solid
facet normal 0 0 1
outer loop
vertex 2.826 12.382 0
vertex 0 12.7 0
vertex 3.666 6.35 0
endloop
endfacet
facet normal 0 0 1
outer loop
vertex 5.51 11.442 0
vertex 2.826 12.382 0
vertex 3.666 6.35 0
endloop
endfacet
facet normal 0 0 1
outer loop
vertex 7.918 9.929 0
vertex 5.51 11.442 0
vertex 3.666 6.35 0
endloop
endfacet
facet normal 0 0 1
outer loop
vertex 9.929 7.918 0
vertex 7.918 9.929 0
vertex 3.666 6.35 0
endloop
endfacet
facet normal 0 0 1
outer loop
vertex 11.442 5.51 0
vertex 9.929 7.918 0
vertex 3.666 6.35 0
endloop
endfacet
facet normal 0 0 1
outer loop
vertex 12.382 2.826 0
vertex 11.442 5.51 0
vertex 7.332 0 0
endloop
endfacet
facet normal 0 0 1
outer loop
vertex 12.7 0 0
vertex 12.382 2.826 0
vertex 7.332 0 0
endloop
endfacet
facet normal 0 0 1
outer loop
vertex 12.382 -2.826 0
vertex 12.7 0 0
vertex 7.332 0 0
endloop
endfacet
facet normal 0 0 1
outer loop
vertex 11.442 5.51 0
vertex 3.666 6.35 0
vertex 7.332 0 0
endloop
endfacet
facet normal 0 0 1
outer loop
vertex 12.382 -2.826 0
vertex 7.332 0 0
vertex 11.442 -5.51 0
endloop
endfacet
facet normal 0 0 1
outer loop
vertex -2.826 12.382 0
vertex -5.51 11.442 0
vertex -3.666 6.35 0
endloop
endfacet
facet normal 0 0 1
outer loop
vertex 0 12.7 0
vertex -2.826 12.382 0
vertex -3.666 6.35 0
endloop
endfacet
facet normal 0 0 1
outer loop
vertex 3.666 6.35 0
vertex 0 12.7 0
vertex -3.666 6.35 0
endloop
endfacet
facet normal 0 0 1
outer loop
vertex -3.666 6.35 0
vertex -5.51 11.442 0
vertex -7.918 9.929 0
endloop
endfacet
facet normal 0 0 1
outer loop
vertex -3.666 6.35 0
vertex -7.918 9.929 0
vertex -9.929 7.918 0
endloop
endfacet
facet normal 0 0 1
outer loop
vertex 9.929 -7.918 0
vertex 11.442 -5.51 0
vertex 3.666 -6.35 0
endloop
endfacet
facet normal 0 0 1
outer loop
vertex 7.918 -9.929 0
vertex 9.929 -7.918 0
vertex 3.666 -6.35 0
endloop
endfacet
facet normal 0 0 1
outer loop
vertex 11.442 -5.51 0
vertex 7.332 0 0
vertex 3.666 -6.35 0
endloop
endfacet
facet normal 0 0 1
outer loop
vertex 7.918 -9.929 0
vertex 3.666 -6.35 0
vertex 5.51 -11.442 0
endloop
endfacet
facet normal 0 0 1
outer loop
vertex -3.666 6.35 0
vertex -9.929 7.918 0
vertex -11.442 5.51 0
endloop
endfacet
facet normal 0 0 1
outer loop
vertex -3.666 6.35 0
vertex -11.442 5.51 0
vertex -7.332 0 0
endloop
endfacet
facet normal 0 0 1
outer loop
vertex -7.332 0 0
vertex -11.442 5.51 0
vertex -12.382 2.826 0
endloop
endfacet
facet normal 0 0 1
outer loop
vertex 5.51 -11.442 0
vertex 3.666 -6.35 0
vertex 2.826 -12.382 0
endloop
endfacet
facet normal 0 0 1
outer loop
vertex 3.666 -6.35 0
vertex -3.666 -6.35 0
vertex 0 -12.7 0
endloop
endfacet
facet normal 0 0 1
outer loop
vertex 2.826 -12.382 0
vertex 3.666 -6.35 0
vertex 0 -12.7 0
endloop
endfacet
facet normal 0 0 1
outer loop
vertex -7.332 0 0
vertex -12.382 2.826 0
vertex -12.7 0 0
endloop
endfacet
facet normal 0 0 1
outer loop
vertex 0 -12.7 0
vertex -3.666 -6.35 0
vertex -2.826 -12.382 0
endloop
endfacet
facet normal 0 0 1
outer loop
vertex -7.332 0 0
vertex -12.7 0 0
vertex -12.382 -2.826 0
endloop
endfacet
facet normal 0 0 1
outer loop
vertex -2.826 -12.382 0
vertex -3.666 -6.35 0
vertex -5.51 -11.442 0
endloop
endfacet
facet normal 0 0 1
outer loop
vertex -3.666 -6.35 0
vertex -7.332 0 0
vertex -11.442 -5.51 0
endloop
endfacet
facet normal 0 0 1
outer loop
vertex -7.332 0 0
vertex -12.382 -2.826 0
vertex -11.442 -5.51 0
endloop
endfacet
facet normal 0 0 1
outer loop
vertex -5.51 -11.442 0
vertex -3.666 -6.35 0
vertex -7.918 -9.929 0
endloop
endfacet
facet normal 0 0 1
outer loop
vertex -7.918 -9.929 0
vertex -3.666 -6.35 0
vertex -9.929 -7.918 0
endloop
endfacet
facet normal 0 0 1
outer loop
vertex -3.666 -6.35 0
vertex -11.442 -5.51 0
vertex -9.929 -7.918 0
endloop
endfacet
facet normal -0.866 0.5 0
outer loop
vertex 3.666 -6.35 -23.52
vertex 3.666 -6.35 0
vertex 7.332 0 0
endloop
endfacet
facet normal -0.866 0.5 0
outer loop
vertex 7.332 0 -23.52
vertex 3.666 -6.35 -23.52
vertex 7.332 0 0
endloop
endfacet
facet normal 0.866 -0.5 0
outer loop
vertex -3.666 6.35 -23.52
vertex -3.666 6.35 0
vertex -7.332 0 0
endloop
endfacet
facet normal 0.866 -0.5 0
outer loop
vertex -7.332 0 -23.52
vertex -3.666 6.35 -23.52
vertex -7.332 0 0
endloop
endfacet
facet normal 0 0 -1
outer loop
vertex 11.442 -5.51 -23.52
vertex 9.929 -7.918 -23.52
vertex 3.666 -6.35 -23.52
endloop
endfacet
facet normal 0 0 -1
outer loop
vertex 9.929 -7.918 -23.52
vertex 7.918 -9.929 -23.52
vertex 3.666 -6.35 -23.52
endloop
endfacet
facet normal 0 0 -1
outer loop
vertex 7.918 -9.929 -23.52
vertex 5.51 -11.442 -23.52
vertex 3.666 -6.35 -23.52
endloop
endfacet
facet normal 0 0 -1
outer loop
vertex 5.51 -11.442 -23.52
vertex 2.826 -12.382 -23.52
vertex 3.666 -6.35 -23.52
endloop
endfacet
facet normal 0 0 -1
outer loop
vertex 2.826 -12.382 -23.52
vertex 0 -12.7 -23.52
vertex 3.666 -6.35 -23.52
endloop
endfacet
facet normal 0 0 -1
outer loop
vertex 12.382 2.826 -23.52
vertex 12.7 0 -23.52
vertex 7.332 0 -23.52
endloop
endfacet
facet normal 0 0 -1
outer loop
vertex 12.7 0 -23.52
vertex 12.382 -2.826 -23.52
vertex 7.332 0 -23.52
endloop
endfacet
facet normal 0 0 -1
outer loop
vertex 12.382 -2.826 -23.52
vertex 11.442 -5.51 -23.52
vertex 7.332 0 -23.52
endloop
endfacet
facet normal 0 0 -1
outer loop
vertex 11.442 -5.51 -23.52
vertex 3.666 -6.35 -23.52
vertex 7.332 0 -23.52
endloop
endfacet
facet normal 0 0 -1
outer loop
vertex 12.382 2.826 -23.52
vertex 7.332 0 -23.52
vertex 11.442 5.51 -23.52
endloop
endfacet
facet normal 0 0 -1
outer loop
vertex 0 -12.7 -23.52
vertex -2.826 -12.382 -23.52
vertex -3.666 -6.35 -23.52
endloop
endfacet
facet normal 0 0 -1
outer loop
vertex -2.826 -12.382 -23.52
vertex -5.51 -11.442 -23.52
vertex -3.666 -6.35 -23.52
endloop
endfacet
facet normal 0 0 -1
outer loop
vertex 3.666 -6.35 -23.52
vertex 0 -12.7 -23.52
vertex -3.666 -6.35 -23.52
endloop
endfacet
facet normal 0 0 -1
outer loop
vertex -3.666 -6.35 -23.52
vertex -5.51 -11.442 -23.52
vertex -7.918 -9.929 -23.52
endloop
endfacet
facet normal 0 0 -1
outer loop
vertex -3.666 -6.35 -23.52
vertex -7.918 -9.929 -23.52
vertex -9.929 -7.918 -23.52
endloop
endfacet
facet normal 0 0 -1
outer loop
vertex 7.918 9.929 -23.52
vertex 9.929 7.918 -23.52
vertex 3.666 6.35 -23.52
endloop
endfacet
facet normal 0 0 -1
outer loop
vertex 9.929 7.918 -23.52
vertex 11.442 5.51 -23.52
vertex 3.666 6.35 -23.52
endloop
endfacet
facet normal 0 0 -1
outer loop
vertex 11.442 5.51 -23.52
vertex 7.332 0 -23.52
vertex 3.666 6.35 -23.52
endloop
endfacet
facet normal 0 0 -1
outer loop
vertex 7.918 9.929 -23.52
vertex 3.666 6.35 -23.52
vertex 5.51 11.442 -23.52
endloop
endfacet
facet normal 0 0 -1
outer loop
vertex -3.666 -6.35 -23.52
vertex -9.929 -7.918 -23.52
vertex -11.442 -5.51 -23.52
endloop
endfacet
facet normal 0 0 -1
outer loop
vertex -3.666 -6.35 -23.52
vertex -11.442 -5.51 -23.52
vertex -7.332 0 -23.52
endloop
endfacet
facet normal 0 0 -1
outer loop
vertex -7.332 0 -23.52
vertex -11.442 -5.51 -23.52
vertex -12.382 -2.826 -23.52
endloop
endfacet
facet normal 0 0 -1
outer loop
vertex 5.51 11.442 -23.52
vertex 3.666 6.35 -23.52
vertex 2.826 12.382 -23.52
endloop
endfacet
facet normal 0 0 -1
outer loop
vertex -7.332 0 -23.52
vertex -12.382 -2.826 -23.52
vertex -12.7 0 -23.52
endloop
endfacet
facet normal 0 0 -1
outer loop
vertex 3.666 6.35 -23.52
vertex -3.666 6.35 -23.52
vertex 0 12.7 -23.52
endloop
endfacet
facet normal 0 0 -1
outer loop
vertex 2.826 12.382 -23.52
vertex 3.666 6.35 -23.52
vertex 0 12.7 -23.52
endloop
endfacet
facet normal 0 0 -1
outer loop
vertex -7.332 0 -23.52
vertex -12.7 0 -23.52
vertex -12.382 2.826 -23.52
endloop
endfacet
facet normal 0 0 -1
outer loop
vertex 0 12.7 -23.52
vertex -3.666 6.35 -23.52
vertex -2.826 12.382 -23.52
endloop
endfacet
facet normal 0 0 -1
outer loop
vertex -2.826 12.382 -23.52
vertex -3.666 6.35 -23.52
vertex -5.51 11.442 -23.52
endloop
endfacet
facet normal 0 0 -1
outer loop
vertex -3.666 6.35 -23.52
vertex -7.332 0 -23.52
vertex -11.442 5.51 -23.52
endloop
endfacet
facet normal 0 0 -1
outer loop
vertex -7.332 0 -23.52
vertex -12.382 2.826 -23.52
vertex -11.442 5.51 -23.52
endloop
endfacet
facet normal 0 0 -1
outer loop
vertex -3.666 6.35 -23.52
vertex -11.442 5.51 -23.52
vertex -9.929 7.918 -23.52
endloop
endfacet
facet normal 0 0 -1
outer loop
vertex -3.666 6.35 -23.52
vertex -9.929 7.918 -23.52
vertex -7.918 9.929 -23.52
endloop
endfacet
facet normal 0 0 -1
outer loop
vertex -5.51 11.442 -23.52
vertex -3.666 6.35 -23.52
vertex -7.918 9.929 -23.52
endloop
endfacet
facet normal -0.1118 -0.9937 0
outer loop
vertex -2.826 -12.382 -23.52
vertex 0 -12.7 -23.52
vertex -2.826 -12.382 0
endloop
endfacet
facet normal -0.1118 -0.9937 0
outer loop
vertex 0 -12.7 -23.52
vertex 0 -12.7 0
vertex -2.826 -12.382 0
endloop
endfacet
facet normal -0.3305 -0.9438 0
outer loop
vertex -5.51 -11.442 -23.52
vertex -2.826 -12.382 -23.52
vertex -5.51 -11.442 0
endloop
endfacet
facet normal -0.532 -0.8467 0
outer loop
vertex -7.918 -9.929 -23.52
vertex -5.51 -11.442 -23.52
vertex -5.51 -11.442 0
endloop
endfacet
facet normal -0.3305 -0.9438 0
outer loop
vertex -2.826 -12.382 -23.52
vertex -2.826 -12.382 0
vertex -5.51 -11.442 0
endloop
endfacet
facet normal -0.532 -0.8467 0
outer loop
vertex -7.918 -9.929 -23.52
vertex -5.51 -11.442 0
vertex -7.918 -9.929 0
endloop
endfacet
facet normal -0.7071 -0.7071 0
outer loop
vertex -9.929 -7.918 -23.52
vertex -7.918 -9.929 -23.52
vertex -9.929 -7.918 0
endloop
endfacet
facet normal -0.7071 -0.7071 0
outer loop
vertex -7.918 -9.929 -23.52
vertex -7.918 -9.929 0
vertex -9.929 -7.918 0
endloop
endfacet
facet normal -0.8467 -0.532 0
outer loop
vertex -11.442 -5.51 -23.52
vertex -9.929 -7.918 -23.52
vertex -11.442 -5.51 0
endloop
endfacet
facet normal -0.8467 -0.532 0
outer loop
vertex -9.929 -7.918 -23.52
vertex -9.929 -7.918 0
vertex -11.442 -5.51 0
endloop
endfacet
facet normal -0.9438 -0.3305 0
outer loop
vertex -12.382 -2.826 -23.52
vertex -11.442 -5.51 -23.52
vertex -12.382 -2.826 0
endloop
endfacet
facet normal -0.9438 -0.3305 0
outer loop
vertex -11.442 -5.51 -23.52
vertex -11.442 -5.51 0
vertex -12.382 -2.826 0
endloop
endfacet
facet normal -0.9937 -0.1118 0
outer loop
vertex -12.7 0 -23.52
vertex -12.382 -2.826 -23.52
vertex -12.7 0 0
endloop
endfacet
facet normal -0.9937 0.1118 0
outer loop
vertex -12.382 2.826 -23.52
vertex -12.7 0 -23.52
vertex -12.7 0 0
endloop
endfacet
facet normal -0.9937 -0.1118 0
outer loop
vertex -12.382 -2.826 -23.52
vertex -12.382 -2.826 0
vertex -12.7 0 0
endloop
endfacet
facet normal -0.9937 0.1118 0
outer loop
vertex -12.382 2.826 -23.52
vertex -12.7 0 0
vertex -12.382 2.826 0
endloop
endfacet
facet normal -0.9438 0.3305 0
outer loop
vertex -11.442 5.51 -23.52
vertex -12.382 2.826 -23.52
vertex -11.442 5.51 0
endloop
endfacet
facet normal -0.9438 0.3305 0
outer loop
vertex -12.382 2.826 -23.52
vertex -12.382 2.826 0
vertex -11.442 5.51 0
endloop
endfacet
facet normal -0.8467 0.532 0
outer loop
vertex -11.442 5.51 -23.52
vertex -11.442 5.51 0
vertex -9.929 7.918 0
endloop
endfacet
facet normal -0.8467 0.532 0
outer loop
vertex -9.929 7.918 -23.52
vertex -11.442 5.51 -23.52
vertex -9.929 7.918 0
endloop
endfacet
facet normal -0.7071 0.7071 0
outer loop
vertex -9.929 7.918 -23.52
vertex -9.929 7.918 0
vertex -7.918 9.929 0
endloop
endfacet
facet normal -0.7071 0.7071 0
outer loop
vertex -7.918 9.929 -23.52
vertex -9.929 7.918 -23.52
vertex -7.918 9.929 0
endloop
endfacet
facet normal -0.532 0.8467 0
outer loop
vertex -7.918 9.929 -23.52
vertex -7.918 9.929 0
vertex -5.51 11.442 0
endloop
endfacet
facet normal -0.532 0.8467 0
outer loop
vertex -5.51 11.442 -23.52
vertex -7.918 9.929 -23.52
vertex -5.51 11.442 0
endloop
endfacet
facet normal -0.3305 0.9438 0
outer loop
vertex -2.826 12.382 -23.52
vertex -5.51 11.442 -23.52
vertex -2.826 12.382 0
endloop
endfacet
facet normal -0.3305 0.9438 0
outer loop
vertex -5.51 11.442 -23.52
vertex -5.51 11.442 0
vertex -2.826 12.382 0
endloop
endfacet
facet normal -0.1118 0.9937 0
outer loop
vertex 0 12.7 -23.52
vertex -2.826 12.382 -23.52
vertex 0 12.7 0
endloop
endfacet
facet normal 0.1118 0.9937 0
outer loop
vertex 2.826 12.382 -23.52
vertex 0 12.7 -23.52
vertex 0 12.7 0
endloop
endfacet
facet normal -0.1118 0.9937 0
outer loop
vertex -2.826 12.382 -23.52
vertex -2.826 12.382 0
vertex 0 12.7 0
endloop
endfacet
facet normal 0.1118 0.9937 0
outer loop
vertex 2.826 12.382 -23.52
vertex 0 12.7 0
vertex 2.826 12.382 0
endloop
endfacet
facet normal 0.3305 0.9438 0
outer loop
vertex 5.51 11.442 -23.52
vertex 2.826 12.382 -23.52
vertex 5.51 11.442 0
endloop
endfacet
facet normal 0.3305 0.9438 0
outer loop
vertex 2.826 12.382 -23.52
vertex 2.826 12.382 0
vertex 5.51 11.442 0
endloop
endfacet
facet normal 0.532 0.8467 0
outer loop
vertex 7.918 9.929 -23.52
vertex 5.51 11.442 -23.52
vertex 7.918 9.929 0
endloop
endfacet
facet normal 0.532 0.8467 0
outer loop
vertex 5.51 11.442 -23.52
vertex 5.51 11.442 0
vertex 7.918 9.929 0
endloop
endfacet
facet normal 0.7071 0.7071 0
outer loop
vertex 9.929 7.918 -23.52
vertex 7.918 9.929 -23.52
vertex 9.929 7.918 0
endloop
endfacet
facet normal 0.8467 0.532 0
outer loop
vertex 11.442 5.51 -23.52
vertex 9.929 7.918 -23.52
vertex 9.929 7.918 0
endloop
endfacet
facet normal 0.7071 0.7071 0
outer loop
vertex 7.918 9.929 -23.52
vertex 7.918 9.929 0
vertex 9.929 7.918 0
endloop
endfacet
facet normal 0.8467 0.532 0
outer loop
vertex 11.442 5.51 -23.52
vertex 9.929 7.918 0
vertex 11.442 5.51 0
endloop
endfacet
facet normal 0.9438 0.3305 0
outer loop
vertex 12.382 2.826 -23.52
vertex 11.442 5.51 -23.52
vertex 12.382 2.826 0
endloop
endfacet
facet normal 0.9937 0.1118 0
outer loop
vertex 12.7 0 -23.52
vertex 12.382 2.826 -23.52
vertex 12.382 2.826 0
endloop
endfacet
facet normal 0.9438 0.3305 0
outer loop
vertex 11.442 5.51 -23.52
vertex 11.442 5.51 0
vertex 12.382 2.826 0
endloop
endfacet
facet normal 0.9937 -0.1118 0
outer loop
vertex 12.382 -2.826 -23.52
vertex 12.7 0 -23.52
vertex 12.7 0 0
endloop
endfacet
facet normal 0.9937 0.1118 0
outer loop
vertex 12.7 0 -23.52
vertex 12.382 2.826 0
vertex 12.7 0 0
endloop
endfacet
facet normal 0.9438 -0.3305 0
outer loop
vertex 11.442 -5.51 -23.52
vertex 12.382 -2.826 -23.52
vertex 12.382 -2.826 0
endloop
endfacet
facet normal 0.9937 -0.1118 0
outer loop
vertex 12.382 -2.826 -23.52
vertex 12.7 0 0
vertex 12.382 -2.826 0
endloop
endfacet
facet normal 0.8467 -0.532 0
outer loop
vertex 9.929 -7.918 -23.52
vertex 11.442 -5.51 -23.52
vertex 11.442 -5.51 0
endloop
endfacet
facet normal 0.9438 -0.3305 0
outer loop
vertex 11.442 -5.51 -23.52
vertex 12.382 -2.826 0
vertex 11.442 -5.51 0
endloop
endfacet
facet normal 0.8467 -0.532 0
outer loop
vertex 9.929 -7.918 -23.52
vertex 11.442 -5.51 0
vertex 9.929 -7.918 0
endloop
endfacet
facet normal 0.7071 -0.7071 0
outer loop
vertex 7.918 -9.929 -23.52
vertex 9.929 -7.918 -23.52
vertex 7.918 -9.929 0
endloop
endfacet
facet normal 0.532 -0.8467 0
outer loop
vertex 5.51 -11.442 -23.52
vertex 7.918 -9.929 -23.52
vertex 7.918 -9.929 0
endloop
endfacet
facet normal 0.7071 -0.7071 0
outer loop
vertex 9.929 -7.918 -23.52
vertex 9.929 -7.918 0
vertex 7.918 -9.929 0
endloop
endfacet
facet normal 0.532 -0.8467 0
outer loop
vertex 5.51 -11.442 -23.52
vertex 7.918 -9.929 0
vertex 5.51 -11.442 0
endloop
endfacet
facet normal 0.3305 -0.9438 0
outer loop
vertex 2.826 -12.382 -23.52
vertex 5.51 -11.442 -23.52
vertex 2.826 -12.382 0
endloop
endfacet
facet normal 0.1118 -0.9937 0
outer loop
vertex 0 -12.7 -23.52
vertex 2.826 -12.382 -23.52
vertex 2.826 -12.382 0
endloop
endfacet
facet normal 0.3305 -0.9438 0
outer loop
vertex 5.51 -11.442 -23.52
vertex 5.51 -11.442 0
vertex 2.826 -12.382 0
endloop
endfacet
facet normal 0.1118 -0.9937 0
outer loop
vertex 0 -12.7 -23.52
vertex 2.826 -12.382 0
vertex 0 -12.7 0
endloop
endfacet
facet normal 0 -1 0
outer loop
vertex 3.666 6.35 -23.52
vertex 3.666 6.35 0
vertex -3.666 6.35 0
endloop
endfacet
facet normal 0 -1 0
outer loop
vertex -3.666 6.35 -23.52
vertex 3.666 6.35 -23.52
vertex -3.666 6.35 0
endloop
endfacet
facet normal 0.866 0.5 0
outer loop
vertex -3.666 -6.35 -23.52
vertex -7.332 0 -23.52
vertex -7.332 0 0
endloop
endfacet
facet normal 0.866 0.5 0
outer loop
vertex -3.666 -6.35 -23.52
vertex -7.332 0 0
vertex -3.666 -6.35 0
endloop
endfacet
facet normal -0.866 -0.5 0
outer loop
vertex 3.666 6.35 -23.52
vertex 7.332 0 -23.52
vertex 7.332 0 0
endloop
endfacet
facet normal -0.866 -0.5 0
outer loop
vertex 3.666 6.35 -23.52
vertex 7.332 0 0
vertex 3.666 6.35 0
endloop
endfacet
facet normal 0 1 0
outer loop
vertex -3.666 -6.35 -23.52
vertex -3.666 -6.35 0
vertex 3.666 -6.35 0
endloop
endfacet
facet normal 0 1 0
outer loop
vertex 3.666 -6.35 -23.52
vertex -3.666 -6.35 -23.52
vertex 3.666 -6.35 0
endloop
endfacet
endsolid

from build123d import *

# Parameters (mm, degrees)
CUT_EXTRUDE1_DEPTH = 30.593736097


with BuildPart() as part:
    # Sketch1 → Revolve1 (revolve)
    with BuildSketch(Plane(origin=(0, 0, 0), x_dir=(0, 0, -1), z_dir=(1, 0, 0)), mode=Mode.PRIVATE) as revolve1_sk:
        Polygon((0, 0), (23.5204, 0), (23.5204, 8.286019513), (23.5204, 12.7), (0, 12.7), (0, 8.286019513), align=None)
    revolve(revolve1_sk.sketch.rotate(Axis((0, 0, 0), (0, 0, -1)), 180), axis=Axis((0, 0, 0), (0, 0, -1)))

    # Sketch2 → Cut-Extrude1 (cut, through all)
    with BuildSketch(Plane.XY):
        Polygon((3.666174209, 6.35), (-3.666174209, 6.35), (-7.332348419, 0), (-3.666174209, -6.35), (3.666174209, -6.35), (7.332348419, 0), align=None)
    extrude(amount=-CUT_EXTRUDE1_DEPTH, mode=Mode.SUBTRACT)


solid = part.part
